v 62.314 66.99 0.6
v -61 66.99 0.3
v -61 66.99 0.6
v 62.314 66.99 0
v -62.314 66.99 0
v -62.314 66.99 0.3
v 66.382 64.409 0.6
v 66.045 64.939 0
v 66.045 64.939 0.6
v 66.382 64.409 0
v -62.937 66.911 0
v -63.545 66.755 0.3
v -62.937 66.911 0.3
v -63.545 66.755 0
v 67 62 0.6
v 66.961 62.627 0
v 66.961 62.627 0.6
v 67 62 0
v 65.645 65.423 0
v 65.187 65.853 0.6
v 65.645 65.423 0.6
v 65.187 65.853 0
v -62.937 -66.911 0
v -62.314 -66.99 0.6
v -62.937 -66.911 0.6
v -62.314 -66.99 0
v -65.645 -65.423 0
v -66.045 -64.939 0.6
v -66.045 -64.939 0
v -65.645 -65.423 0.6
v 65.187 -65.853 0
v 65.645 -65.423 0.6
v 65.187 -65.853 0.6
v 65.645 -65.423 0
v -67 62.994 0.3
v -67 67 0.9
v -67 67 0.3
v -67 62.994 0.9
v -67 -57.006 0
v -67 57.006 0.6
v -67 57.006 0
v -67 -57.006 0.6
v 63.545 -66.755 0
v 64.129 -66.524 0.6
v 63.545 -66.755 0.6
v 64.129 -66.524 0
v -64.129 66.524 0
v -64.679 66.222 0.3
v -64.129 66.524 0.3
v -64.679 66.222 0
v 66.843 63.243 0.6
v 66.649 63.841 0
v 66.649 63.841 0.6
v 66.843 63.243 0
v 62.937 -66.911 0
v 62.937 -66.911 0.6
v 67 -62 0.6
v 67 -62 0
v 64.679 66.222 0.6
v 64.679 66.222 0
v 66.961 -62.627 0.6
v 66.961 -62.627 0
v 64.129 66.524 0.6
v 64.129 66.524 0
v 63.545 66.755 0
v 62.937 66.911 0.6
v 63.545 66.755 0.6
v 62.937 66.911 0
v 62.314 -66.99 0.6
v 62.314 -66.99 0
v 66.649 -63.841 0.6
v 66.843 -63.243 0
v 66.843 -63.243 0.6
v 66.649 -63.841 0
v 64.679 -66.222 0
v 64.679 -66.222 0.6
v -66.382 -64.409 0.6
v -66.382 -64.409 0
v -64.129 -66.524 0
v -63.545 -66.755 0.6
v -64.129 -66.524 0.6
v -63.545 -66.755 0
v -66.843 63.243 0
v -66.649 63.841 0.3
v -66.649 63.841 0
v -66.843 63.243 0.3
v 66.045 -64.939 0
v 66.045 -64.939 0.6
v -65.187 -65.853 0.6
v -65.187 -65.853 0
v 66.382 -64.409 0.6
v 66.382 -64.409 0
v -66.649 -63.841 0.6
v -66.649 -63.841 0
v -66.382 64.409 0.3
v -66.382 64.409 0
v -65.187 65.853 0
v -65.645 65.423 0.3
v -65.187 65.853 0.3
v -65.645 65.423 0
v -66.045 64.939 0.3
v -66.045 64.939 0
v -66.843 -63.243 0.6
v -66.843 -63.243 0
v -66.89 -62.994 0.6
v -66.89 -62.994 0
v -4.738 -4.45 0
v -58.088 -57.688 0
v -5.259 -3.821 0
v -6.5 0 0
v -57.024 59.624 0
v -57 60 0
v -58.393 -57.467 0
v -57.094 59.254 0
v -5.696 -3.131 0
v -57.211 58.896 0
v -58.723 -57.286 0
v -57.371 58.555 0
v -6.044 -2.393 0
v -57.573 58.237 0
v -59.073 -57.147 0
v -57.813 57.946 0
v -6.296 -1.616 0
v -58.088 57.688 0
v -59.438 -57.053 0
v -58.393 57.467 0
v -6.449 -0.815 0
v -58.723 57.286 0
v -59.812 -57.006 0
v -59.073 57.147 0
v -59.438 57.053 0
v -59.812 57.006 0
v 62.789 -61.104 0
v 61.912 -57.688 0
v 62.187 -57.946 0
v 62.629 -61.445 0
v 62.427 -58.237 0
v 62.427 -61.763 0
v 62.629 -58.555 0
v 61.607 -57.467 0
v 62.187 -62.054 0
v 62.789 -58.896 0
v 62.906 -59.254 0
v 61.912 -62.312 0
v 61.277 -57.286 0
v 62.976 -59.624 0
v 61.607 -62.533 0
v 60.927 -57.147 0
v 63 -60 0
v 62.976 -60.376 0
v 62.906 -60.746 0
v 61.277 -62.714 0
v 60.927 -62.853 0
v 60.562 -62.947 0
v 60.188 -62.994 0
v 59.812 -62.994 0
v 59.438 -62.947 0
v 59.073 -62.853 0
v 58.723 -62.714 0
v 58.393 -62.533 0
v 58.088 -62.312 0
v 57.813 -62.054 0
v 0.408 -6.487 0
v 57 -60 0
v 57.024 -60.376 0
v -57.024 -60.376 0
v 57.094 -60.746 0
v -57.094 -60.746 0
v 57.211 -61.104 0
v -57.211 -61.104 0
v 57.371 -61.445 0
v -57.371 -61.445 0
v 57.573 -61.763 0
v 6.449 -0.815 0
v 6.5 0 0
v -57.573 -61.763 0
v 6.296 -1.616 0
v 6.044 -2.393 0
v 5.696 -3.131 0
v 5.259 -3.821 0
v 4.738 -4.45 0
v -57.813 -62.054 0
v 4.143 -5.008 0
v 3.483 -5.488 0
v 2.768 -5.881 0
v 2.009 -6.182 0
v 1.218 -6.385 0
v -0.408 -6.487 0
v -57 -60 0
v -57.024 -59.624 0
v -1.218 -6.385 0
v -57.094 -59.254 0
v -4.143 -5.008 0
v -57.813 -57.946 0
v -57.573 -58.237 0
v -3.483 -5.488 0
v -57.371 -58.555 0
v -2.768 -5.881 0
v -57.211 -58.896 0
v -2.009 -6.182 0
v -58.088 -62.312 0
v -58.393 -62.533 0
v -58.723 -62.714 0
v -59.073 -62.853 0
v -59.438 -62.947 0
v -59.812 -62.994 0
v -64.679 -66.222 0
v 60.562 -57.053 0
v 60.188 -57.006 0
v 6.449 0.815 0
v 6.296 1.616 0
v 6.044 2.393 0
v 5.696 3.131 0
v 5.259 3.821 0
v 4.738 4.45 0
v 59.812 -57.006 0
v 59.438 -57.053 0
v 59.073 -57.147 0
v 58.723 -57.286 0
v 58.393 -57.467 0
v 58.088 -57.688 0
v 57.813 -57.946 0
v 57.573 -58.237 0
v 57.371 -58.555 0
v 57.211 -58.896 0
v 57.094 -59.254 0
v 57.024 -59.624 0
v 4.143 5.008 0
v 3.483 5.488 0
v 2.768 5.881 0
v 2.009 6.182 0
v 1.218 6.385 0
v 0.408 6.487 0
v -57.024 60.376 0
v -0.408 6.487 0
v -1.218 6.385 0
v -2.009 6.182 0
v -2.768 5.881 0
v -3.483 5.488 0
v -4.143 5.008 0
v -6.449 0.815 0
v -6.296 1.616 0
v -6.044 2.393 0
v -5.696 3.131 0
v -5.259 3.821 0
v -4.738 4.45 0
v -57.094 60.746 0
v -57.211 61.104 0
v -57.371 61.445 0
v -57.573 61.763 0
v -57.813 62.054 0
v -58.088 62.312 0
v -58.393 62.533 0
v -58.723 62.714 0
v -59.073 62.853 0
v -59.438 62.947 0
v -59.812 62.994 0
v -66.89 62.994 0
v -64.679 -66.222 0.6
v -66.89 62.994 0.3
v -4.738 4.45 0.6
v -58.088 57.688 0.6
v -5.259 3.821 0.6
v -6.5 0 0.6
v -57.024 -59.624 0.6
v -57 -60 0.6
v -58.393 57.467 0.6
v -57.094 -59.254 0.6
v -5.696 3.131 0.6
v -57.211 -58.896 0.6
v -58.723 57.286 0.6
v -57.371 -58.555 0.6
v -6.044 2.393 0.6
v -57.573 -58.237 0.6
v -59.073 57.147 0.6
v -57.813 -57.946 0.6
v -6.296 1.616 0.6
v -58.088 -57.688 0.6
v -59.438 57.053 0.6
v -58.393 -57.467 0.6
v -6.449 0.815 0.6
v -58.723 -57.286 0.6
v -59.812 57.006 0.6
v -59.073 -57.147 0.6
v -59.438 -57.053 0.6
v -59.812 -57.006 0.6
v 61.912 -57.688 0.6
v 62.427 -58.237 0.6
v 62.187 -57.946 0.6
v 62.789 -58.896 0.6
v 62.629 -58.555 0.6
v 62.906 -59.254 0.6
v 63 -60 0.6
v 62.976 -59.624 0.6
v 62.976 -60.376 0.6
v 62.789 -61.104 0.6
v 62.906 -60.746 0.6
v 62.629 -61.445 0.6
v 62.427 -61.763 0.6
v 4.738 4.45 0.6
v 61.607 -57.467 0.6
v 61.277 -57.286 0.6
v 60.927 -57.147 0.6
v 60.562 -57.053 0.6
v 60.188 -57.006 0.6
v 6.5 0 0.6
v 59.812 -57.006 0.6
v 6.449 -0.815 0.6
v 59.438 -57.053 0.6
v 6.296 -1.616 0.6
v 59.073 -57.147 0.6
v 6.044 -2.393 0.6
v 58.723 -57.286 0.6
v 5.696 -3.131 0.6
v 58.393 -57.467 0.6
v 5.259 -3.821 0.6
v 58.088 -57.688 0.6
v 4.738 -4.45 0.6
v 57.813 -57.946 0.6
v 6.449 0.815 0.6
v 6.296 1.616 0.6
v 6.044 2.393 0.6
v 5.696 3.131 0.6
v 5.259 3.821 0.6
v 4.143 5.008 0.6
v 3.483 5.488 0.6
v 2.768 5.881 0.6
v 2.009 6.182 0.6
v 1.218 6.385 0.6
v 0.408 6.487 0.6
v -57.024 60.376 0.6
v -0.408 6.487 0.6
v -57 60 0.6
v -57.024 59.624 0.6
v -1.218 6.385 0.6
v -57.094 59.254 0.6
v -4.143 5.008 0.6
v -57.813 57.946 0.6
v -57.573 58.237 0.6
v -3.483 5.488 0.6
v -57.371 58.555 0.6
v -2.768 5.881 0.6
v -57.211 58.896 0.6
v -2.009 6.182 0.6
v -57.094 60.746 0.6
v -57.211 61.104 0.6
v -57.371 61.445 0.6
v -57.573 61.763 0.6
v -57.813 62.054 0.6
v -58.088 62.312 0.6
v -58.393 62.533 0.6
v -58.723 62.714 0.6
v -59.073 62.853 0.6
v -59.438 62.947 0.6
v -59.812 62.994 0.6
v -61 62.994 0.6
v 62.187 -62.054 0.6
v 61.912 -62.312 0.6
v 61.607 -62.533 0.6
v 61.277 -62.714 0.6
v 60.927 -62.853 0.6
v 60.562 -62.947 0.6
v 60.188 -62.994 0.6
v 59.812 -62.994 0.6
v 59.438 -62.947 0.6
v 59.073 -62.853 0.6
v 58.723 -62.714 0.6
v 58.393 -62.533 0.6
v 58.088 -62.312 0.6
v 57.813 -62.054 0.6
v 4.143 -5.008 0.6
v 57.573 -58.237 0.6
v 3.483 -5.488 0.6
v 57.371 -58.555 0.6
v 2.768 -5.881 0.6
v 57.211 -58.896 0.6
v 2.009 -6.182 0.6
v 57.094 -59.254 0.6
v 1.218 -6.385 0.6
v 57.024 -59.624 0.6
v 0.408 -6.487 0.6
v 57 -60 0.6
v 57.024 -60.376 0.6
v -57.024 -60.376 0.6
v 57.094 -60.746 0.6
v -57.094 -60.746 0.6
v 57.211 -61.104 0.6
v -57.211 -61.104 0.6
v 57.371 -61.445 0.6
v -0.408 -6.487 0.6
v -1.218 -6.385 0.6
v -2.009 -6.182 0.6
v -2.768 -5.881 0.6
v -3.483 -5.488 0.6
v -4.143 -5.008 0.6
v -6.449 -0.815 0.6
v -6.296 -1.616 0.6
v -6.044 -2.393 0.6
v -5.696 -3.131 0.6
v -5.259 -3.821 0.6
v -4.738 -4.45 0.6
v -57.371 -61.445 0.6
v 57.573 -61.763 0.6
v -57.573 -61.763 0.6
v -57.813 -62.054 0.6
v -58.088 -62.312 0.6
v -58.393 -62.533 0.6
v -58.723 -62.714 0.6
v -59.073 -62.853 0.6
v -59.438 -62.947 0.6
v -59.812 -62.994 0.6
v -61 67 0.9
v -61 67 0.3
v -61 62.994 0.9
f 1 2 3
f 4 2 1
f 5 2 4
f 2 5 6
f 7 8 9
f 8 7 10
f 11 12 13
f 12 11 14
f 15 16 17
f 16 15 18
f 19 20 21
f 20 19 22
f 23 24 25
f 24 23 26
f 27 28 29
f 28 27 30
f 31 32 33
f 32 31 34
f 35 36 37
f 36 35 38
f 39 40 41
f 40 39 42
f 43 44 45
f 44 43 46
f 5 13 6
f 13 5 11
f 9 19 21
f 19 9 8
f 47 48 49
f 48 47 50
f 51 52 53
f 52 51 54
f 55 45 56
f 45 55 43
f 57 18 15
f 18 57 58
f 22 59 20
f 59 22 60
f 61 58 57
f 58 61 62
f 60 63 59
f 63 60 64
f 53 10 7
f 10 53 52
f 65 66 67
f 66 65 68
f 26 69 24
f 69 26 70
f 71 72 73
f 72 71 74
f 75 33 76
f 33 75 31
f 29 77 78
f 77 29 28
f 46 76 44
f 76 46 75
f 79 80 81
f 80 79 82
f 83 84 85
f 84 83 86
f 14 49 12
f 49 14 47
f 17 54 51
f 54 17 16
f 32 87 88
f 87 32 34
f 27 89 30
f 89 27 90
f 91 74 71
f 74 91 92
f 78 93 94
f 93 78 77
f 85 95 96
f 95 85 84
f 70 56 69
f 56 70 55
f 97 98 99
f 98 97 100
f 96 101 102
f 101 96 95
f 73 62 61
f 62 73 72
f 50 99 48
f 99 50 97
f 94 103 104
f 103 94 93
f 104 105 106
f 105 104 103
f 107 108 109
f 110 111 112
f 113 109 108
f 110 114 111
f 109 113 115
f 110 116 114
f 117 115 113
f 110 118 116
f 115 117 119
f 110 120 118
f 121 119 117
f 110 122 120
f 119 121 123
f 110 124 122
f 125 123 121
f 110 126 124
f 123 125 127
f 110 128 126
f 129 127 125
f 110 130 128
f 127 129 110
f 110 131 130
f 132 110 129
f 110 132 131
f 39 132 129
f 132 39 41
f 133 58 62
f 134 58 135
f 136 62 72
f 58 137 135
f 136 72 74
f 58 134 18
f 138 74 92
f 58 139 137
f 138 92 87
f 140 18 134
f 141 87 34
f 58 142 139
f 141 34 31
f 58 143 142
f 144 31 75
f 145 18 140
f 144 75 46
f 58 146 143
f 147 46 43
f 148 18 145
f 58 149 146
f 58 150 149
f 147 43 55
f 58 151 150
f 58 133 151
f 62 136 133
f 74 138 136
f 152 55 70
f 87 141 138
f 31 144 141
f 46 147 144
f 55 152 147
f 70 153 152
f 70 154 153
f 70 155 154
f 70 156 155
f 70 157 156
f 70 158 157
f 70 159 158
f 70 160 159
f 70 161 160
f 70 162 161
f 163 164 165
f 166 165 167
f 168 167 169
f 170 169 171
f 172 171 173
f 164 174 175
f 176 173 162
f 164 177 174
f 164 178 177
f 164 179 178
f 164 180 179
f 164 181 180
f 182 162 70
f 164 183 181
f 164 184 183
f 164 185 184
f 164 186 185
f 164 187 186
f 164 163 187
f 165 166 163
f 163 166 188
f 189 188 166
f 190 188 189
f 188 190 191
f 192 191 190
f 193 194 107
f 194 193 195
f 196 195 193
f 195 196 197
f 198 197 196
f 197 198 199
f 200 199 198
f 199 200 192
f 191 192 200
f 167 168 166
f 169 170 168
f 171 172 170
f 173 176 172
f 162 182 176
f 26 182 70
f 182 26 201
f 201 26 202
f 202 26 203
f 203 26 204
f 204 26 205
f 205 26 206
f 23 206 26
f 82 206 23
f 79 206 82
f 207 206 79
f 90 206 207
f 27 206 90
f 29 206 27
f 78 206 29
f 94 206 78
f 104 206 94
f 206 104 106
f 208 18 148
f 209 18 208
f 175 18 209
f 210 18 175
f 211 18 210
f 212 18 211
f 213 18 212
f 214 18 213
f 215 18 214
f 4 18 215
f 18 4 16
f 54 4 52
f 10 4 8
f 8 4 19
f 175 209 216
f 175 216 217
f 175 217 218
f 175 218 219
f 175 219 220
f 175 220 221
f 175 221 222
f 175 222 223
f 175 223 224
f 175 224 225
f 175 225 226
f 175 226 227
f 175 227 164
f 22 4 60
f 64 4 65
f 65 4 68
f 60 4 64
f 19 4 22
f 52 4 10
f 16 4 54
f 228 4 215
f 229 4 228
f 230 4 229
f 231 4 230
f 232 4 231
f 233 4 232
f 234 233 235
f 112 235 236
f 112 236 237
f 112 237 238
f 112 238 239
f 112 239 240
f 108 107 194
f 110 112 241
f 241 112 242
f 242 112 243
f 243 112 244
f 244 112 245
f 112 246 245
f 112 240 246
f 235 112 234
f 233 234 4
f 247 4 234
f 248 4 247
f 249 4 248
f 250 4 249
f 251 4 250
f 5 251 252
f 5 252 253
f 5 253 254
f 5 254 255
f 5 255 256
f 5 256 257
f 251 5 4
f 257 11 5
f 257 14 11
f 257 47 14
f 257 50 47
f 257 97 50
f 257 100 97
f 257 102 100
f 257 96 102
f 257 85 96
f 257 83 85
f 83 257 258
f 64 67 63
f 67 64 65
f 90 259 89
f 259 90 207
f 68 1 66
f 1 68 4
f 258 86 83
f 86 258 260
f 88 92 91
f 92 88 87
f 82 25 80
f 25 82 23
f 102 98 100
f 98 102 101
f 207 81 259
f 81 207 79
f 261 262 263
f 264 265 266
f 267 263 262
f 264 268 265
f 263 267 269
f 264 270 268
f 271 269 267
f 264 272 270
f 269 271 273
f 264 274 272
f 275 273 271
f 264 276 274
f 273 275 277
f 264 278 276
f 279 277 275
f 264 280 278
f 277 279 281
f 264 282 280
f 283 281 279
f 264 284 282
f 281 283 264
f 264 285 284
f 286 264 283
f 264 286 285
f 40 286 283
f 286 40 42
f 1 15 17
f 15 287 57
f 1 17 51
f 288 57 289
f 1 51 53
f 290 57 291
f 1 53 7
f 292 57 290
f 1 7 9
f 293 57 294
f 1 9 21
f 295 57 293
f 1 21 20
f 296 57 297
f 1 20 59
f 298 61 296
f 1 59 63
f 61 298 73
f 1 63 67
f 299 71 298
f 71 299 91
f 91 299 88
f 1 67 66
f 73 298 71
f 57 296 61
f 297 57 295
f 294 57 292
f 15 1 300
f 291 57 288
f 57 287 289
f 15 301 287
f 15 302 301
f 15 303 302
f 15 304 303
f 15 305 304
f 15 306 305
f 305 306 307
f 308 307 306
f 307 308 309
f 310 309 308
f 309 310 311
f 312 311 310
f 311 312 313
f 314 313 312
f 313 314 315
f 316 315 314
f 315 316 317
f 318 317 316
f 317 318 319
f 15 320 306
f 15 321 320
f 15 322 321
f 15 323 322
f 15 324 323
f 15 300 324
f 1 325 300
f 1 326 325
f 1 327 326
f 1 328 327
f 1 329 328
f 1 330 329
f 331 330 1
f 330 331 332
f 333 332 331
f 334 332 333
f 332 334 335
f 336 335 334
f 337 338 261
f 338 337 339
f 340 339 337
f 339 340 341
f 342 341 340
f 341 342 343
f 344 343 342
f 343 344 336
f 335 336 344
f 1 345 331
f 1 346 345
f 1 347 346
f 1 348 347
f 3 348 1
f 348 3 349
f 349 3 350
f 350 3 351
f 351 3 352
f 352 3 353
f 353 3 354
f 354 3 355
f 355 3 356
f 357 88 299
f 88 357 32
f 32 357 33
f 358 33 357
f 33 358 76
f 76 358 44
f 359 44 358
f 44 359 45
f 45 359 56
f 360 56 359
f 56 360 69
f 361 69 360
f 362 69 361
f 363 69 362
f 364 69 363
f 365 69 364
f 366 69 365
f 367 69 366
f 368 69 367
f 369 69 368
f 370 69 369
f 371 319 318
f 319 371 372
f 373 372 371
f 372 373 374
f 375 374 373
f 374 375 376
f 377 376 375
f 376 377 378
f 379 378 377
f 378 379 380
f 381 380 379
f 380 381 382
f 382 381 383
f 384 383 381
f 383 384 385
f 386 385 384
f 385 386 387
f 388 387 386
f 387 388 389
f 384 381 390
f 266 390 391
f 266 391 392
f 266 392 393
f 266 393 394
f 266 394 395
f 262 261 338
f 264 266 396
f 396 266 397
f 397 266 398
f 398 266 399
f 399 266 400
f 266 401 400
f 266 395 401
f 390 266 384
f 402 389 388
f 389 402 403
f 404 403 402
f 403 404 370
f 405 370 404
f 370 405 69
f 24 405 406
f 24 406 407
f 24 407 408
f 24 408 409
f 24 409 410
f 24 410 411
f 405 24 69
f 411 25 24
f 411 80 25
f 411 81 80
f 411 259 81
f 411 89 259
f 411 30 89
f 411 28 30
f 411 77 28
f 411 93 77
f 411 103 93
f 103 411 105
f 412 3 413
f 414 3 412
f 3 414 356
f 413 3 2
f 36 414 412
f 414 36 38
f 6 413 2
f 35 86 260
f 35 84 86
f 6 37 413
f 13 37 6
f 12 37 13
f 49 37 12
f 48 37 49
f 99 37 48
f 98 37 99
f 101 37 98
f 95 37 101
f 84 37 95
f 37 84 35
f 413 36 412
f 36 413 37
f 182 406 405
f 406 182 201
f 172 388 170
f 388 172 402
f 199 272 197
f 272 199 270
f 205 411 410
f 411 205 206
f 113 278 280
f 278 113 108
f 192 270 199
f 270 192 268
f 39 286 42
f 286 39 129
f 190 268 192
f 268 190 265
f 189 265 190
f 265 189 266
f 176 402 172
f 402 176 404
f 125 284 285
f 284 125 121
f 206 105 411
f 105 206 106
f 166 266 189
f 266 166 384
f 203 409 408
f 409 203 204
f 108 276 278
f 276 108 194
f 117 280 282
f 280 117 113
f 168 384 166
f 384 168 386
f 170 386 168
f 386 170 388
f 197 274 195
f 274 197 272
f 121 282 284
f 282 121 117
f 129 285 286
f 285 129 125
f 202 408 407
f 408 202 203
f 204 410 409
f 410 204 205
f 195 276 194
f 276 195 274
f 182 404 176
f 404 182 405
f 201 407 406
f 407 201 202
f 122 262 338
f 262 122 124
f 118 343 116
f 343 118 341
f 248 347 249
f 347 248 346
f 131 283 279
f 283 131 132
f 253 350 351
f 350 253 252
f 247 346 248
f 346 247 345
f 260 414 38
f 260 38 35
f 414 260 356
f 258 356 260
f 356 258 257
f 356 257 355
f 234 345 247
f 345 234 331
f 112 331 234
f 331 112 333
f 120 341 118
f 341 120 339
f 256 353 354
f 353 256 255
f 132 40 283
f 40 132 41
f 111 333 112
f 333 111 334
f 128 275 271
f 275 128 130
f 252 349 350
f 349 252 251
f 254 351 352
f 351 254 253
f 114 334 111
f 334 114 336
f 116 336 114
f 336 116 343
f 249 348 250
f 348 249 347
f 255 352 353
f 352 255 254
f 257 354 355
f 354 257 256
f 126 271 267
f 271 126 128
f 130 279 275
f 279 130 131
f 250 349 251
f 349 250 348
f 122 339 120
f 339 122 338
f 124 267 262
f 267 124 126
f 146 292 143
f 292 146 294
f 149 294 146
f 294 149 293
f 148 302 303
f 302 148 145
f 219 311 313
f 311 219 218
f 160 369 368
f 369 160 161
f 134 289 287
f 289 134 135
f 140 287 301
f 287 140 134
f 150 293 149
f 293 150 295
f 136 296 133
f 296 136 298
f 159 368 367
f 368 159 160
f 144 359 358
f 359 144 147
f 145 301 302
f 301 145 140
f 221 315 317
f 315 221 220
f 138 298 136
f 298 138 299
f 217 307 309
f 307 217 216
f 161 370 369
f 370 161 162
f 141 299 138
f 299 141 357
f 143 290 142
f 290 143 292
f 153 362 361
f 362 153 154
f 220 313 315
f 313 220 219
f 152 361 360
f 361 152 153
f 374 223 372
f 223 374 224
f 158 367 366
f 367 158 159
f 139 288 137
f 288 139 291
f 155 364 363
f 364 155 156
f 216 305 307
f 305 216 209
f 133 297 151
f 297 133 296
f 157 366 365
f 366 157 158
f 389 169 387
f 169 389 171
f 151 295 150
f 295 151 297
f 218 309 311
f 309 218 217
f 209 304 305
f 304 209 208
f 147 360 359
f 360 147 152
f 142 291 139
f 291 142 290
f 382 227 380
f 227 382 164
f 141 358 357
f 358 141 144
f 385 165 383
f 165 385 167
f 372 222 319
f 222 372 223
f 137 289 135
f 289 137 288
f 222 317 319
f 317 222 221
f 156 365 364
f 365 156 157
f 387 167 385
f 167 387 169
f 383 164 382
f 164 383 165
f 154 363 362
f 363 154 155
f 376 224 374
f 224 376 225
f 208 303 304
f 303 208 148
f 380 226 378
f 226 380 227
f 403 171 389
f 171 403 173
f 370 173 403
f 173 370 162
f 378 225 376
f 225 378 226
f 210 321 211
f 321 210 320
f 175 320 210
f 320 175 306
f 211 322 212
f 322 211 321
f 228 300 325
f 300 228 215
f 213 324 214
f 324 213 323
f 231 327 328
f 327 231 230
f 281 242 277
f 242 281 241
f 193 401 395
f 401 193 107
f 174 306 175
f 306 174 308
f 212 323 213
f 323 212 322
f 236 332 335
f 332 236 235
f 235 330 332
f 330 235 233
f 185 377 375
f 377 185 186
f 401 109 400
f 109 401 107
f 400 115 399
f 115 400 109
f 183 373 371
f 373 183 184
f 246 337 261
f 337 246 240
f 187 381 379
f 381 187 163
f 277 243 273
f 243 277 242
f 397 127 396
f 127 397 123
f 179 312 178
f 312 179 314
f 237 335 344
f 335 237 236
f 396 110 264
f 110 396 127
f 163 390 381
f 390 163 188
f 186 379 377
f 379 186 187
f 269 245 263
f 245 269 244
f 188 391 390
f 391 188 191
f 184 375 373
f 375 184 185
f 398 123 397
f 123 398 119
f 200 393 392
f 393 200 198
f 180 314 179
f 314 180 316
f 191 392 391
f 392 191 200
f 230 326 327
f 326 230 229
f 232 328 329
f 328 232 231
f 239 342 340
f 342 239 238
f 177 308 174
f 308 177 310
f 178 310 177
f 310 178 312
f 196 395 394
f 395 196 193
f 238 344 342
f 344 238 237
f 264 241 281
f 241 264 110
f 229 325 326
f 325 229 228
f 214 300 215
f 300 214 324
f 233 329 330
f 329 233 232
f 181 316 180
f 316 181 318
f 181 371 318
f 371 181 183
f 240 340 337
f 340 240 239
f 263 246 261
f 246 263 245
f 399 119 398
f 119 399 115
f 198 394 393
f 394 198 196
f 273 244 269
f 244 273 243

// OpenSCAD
$fn = 50;


difference() {
	union() {
		translate(v = [0, 0, 0]) {
			rotate(a = [0, 0, 0]) {
				hull() {
					translate(v = [-62.0000000000, 62.0000000000, 0]) {
						rotate(a = [0, 0, 0]) {
							translate(v = [0, 0, 0]) {
								rotate(a = [0, 0, 0]) {
									cylinder(h = 0.6000000000, r = 5);
								}
							}
						}
					}
					translate(v = [62.0000000000, 62.0000000000, 0]) {
						rotate(a = [0, 0, 0]) {
							translate(v = [0, 0, 0]) {
								rotate(a = [0, 0, 0]) {
									cylinder(h = 0.6000000000, r = 5);
								}
							}
						}
					}
					translate(v = [-62.0000000000, -62.0000000000, 0]) {
						rotate(a = [0, 0, 0]) {
							translate(v = [0, 0, 0]) {
								rotate(a = [0, 0, 0]) {
									cylinder(h = 0.6000000000, r = 5);
								}
							}
						}
					}
					translate(v = [62.0000000000, -62.0000000000, 0]) {
						rotate(a = [0, 0, 0]) {
							translate(v = [0, 0, 0]) {
								rotate(a = [0, 0, 0]) {
									cylinder(h = 0.6000000000, r = 5);
								}
							}
						}
					}
				}
			}
		}
		#translate(v = [-67.0000000000, 61.0000000000, 0.3000000000]) {
			rotate(a = [0, 0, 0]) {
				cube(size = [6, 6, 0.6000000000]);
			}
		}
	}
	union() {
		translate(v = [-67.5000000000, -60.0000000000, -125]) {
			rotate(a = [0, 0, 0]) {
				hull() {
					translate(v = [7.5000000000, 0, 0]) {
						rotate(a = [0, 0, 0]) {
							translate(v = [0, 0, 0]) {
								rotate(a = [0, 0, 0]) {
									cylinder(h = 250, r = 3.0000000000);
								}
							}
						}
					}
					translate(v = [-7.5000000000, 0, 0]) {
						rotate(a = [0, 0, 0]) {
							translate(v = [0, 0, 0]) {
								rotate(a = [0, 0, 0]) {
									cylinder(h = 250, r = 3.0000000000);
								}
							}
						}
					}
				}
			}
		}
		translate(v = [-67.5000000000, 60.0000000000, -125]) {
			rotate(a = [0, 0, 0]) {
				hull() {
					translate(v = [7.5000000000, 0, 0]) {
						rotate(a = [0, 0, 0]) {
							translate(v = [0, 0, 0]) {
								rotate(a = [0, 0, 0]) {
									cylinder(h = 250, r = 3.0000000000);
								}
							}
						}
					}
					translate(v = [-7.5000000000, 0, 0]) {
						rotate(a = [0, 0, 0]) {
							translate(v = [0, 0, 0]) {
								rotate(a = [0, 0, 0]) {
									cylinder(h = 250, r = 3.0000000000);
								}
							}
						}
					}
				}
			}
		}
		translate(v = [60.0000000000, -60.0000000000, -125.0000000000]) {
			rotate(a = [0, 0, 0]) {
				cylinder(h = 250, r = 3.0000000000);
			}
		}
		translate(v = [0, 0, 0.0000000000]) {
			rotate(a = [0, 0, 0]) {
				cylinder(h = 0.6000000000, r = 6.5000000000);
			}
		}
	}
}
